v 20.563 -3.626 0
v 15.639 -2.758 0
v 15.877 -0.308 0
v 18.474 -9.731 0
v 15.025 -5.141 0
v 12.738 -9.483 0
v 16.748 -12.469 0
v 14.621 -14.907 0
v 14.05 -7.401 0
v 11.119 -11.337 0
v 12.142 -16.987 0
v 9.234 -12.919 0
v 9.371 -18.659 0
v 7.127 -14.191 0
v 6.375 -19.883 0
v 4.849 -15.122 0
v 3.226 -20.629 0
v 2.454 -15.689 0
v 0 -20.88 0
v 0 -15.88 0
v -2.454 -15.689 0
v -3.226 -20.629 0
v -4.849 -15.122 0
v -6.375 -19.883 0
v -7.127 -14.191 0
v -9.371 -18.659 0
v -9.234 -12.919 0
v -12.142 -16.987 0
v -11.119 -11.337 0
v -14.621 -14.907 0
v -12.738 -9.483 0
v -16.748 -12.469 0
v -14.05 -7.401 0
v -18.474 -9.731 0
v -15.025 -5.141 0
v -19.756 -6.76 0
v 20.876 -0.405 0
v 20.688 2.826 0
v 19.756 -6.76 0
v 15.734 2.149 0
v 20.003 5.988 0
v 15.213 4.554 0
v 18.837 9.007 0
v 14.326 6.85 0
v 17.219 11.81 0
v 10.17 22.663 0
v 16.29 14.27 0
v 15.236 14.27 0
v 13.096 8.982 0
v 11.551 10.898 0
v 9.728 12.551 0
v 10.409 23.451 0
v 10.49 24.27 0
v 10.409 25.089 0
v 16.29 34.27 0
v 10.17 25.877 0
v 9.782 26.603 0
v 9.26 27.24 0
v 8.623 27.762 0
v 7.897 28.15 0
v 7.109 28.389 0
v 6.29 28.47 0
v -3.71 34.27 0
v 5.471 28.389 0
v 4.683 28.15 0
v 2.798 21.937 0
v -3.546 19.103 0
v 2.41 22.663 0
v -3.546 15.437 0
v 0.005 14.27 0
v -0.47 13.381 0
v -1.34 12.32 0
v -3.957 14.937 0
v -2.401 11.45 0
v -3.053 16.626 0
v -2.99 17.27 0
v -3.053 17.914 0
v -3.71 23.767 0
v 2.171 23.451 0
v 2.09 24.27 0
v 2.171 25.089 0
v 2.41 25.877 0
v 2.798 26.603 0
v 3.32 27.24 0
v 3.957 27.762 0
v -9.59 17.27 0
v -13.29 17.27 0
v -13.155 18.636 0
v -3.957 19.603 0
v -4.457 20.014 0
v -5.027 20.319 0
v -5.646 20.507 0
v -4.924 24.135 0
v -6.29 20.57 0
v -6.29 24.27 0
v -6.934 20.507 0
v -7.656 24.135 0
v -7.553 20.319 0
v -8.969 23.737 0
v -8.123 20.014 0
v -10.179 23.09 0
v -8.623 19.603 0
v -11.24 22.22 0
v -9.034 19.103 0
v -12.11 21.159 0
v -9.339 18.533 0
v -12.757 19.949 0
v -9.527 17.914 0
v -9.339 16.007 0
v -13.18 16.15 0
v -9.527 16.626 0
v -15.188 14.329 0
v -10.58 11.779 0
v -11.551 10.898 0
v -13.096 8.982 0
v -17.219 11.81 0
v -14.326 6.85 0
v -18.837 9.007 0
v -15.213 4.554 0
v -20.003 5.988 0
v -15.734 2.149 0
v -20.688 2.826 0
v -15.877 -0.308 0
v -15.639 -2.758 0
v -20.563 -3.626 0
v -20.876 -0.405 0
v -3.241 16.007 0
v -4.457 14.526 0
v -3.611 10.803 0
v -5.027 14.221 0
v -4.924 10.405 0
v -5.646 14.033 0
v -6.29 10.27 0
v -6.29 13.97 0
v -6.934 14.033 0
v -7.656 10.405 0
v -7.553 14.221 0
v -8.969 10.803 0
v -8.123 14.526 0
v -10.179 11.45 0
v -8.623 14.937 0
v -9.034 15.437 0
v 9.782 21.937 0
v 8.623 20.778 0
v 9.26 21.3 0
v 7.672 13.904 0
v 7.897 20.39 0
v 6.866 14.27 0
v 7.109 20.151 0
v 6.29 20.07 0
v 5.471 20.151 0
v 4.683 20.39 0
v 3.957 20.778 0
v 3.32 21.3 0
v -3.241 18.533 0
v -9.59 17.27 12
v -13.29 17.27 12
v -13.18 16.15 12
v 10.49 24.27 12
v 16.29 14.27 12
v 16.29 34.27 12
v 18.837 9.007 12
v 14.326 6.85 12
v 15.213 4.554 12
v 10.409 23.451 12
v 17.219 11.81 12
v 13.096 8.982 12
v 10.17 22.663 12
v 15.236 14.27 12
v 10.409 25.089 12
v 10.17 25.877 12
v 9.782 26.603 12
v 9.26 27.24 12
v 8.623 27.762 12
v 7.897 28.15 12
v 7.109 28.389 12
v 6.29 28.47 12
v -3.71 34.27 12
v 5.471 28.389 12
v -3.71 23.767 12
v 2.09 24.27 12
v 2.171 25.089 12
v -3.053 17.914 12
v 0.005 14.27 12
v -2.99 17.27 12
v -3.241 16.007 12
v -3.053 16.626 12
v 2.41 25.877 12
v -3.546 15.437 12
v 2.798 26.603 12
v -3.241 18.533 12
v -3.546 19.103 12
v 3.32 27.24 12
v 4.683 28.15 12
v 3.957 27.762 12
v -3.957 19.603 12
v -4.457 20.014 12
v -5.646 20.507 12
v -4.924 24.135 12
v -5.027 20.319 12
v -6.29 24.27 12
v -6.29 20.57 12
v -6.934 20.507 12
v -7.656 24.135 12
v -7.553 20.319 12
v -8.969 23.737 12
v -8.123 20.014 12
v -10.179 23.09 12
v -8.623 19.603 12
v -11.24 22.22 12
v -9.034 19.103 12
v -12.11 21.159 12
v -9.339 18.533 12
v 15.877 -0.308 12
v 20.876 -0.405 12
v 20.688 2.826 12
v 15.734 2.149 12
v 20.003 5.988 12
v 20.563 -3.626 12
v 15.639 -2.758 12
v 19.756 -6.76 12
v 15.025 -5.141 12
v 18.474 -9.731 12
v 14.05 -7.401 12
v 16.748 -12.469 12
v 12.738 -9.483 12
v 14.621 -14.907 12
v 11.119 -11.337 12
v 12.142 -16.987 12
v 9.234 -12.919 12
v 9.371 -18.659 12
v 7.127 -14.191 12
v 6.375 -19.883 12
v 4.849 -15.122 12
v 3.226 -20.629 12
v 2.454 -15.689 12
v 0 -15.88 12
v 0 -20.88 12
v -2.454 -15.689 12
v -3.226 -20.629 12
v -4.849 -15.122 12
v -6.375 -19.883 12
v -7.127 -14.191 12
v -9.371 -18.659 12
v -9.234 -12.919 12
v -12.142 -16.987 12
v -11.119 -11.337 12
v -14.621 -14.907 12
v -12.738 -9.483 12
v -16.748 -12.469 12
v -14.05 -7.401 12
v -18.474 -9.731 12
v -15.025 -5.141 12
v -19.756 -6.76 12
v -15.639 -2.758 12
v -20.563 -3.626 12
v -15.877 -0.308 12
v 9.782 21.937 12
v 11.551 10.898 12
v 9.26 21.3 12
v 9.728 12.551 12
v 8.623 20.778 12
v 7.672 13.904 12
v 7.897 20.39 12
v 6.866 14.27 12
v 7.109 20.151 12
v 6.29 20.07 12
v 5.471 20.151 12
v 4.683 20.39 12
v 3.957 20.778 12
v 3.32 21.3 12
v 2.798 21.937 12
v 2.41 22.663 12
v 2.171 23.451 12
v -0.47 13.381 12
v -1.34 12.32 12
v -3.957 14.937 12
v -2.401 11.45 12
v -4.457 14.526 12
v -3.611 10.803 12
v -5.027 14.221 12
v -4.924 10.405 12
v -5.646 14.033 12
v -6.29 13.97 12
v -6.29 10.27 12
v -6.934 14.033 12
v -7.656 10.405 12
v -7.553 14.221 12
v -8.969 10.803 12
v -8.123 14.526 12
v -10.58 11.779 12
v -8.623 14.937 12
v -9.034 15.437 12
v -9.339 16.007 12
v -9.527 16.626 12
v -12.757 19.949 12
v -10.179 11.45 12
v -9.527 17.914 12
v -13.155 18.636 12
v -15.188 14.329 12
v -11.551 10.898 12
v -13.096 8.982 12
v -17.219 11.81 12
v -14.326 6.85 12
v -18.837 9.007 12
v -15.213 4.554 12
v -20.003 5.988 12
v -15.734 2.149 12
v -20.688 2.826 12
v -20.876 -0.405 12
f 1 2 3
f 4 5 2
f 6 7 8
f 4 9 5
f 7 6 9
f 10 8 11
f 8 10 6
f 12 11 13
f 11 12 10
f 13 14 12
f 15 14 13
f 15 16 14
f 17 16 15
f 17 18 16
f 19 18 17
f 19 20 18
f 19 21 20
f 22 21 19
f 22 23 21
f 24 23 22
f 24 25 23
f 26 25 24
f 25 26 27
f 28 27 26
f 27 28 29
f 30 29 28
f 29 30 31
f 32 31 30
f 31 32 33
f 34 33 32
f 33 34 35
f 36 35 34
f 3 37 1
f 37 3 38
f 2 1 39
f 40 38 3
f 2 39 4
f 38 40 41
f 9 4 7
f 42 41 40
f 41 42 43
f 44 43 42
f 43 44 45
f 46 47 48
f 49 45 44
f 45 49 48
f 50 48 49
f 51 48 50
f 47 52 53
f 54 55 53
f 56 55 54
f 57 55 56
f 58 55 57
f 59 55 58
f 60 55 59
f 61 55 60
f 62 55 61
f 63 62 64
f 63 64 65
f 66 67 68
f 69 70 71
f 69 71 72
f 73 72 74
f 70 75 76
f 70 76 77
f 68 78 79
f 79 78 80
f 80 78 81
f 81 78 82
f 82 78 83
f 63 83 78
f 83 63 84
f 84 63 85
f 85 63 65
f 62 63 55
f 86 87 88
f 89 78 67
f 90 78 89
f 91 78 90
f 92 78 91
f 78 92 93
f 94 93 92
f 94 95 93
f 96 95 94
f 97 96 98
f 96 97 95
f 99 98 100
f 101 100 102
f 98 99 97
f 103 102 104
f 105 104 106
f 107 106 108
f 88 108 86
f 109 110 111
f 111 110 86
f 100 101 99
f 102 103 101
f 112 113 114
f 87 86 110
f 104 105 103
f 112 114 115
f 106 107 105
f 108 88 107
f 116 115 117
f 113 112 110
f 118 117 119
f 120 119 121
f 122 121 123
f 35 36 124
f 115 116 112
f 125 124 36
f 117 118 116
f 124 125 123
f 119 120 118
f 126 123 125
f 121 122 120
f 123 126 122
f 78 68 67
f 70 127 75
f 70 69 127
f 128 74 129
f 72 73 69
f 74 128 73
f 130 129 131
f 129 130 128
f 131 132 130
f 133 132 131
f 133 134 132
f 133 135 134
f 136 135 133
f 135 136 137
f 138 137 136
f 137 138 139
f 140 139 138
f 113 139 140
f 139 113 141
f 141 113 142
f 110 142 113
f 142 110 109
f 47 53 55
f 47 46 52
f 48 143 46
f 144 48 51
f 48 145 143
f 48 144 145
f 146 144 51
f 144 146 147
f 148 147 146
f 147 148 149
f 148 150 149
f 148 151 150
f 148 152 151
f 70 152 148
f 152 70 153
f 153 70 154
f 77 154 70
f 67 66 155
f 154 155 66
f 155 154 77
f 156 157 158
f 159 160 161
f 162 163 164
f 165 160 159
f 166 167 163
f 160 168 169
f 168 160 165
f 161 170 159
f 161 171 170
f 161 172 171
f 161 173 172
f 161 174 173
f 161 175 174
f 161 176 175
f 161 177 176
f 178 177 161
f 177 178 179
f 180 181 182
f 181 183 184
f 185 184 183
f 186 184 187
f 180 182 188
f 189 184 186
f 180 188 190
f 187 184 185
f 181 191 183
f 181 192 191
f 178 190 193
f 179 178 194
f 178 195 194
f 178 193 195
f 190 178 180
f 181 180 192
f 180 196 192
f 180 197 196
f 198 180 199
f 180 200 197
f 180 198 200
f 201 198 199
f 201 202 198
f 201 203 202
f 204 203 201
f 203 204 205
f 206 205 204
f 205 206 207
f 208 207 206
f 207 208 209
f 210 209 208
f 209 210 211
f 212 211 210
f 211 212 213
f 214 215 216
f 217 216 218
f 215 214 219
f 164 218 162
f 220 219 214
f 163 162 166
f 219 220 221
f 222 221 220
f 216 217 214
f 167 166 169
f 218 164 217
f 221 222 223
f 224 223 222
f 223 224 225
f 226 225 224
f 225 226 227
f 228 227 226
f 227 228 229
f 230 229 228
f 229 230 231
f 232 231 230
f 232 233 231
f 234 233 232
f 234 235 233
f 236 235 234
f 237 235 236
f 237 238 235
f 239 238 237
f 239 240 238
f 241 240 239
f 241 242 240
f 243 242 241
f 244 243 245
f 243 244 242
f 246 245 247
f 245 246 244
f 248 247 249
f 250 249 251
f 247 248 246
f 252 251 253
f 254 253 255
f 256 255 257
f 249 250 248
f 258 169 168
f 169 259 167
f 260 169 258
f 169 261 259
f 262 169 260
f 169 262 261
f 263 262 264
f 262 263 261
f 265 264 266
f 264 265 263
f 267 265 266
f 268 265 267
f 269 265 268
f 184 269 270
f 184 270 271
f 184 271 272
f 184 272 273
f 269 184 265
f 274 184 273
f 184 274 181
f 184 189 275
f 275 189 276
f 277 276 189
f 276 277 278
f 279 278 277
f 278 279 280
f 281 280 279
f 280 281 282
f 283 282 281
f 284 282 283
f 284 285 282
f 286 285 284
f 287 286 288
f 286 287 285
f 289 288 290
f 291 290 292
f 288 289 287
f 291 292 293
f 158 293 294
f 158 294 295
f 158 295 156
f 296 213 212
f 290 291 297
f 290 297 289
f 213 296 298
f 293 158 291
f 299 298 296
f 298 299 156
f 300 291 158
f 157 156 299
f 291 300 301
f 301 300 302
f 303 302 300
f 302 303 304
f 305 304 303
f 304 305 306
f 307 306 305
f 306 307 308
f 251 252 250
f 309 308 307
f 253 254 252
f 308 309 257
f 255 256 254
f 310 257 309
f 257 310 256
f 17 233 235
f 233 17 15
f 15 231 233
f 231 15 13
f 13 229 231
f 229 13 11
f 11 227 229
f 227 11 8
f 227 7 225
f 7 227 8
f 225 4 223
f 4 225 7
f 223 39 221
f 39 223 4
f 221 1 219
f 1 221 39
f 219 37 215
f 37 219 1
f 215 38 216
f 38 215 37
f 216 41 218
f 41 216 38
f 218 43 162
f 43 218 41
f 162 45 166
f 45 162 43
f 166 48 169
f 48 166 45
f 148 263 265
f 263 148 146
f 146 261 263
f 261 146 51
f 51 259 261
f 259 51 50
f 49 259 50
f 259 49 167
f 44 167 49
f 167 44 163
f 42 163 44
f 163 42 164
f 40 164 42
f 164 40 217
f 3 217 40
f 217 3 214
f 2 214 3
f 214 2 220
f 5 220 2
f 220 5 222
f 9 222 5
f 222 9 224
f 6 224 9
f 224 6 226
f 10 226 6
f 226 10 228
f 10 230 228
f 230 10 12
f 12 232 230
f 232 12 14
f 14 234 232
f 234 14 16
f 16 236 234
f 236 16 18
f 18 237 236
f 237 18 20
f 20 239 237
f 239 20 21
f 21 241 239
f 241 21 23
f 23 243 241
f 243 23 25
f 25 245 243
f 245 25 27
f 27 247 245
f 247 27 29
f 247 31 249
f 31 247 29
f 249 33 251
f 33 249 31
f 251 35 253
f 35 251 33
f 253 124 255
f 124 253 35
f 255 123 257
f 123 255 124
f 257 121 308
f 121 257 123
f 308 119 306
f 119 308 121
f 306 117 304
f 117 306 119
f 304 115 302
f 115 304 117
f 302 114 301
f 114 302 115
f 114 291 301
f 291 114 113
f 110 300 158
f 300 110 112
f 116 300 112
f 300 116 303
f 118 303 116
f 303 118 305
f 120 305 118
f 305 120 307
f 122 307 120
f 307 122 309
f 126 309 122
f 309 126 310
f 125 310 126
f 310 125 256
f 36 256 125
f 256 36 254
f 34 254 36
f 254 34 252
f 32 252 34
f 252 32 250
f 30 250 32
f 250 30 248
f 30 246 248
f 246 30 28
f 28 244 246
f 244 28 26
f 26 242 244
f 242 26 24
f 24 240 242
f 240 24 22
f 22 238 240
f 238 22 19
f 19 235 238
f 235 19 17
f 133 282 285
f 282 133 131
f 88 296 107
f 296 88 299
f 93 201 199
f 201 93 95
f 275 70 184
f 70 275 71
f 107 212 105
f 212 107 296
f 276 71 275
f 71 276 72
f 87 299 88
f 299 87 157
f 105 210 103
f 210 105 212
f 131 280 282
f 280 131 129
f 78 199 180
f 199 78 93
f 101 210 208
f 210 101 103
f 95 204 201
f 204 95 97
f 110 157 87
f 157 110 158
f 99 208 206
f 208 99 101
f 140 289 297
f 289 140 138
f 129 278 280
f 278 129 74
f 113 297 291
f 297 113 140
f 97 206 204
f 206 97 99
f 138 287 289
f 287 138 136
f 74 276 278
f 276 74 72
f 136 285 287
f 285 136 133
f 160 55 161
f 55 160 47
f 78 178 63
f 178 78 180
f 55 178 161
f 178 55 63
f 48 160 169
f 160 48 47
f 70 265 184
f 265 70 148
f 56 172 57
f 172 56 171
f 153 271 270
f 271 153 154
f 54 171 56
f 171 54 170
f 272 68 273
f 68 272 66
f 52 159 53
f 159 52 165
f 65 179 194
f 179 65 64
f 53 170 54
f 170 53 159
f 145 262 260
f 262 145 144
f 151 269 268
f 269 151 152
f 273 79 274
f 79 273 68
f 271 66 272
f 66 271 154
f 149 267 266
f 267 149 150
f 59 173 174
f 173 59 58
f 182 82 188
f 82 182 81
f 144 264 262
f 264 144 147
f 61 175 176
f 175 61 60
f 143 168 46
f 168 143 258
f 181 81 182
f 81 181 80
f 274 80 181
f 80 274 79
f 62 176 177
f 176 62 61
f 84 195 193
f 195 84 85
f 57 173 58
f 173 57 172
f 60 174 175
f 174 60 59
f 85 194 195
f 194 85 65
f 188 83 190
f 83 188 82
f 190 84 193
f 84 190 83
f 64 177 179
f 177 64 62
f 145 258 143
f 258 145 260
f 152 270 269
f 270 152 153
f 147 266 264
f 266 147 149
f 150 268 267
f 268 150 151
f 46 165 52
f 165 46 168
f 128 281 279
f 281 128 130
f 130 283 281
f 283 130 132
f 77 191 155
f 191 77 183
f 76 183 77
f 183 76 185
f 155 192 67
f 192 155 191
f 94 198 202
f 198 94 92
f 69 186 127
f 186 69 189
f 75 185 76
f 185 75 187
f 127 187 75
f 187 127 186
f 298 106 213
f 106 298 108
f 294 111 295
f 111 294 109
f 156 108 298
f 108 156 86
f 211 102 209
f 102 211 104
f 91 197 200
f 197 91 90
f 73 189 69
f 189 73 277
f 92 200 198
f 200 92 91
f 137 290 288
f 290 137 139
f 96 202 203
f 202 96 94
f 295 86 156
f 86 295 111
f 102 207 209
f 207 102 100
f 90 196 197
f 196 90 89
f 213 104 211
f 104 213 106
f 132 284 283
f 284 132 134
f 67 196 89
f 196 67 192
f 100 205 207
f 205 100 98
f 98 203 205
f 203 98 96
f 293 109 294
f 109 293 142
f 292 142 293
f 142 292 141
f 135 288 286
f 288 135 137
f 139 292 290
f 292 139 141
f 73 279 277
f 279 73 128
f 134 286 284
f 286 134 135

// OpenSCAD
$fn = 32;

// ----------------------------------------------------------------------
// Pipe clamp: 41.76 mm ring, 5 mm wall, 12 mm wide
// ----------------------------------------------------------------------

// --- parameters (mm) ---
outer_r = 20.88;          // clamp outside radius
inner_r = 15.88;          // pipe bore radius
band = 5;                 // band thickness
clamp_w = 12;             // clamp width
opening = 40;             // opening angle between the ends
lug_w = 20;               // lug width
lug_len = 20;             // lug length
bolt_d = 8.4;             // bolt hole
knuckle_d = 14;           // hinge knuckle diameter
pin_d = 6.6;              // hinge pin hole

clamp_profile = [[-7.141, 19.621], [-10.087, 18.282], [-12.791, 16.503], [-15.188, 14.329], [-17.219, 11.81], [-18.837, 9.007], [-20.003, 5.988], [-20.688, 2.826], [-20.876, -0.405], [-20.563, -3.626], [-19.756, -6.76], [-18.474, -9.731], [-16.748, -12.469], [-14.621, -14.907], [-12.142, -16.987], [-9.371, -18.659], [-6.375, -19.883], [-3.226, -20.629], [0, -20.88], [3.226, -20.629], [6.375, -19.883], [9.371, -18.659], [12.142, -16.987], [14.621, -14.907], [16.748, -12.469], [18.474, -9.731], [19.756, -6.76], [20.563, -3.626], [20.876, -0.405], [20.688, 2.826], [20.003, 5.988], [18.837, 9.007], [17.219, 11.81], [15.188, 14.329], [12.791, 16.503], [10.087, 18.282], [7.141, 19.621], [5.431, 14.922], [7.672, 13.904], [9.728, 12.551], [11.551, 10.898], [13.096, 8.982], [14.326, 6.85], [15.213, 4.554], [15.734, 2.149], [15.877, -0.308], [15.639, -2.758], [15.025, -5.141], [14.05, -7.401], [12.738, -9.483], [11.119, -11.337], [9.234, -12.919], [7.127, -14.191], [4.849, -15.122], [2.454, -15.689], [0, -15.88], [-2.454, -15.689], [-4.849, -15.122], [-7.127, -14.191], [-9.234, -12.919], [-11.119, -11.337], [-12.738, -9.483], [-14.05, -7.401], [-15.025, -5.141], [-15.639, -2.758], [-15.877, -0.308], [-15.734, 2.149], [-15.213, 4.554], [-14.326, 6.85], [-13.096, 8.982], [-11.551, 10.898], [-9.728, 12.551], [-7.672, 13.904], [-5.431, 14.922]];

difference() {
  union() {
    linear_extrude(height = clamp_w) polygon(clamp_profile);
    /* hinge knuckle, sunk 2 mm into the band end */
    translate([-6.29, 17.27, 0]) cylinder(h = clamp_w, d = knuckle_d);
    /* bolt lug on the other end */
    translate([-3.71, 14.27, 0]) cube([lug_w, 20, clamp_w]);
  }
  translate([6.29, 24.27, -2.5]) cylinder(h = clamp_w + 5, d = bolt_d);
  translate([-6.29, 17.27, -2.5]) cylinder(h = clamp_w + 5, d = pin_d);
}
